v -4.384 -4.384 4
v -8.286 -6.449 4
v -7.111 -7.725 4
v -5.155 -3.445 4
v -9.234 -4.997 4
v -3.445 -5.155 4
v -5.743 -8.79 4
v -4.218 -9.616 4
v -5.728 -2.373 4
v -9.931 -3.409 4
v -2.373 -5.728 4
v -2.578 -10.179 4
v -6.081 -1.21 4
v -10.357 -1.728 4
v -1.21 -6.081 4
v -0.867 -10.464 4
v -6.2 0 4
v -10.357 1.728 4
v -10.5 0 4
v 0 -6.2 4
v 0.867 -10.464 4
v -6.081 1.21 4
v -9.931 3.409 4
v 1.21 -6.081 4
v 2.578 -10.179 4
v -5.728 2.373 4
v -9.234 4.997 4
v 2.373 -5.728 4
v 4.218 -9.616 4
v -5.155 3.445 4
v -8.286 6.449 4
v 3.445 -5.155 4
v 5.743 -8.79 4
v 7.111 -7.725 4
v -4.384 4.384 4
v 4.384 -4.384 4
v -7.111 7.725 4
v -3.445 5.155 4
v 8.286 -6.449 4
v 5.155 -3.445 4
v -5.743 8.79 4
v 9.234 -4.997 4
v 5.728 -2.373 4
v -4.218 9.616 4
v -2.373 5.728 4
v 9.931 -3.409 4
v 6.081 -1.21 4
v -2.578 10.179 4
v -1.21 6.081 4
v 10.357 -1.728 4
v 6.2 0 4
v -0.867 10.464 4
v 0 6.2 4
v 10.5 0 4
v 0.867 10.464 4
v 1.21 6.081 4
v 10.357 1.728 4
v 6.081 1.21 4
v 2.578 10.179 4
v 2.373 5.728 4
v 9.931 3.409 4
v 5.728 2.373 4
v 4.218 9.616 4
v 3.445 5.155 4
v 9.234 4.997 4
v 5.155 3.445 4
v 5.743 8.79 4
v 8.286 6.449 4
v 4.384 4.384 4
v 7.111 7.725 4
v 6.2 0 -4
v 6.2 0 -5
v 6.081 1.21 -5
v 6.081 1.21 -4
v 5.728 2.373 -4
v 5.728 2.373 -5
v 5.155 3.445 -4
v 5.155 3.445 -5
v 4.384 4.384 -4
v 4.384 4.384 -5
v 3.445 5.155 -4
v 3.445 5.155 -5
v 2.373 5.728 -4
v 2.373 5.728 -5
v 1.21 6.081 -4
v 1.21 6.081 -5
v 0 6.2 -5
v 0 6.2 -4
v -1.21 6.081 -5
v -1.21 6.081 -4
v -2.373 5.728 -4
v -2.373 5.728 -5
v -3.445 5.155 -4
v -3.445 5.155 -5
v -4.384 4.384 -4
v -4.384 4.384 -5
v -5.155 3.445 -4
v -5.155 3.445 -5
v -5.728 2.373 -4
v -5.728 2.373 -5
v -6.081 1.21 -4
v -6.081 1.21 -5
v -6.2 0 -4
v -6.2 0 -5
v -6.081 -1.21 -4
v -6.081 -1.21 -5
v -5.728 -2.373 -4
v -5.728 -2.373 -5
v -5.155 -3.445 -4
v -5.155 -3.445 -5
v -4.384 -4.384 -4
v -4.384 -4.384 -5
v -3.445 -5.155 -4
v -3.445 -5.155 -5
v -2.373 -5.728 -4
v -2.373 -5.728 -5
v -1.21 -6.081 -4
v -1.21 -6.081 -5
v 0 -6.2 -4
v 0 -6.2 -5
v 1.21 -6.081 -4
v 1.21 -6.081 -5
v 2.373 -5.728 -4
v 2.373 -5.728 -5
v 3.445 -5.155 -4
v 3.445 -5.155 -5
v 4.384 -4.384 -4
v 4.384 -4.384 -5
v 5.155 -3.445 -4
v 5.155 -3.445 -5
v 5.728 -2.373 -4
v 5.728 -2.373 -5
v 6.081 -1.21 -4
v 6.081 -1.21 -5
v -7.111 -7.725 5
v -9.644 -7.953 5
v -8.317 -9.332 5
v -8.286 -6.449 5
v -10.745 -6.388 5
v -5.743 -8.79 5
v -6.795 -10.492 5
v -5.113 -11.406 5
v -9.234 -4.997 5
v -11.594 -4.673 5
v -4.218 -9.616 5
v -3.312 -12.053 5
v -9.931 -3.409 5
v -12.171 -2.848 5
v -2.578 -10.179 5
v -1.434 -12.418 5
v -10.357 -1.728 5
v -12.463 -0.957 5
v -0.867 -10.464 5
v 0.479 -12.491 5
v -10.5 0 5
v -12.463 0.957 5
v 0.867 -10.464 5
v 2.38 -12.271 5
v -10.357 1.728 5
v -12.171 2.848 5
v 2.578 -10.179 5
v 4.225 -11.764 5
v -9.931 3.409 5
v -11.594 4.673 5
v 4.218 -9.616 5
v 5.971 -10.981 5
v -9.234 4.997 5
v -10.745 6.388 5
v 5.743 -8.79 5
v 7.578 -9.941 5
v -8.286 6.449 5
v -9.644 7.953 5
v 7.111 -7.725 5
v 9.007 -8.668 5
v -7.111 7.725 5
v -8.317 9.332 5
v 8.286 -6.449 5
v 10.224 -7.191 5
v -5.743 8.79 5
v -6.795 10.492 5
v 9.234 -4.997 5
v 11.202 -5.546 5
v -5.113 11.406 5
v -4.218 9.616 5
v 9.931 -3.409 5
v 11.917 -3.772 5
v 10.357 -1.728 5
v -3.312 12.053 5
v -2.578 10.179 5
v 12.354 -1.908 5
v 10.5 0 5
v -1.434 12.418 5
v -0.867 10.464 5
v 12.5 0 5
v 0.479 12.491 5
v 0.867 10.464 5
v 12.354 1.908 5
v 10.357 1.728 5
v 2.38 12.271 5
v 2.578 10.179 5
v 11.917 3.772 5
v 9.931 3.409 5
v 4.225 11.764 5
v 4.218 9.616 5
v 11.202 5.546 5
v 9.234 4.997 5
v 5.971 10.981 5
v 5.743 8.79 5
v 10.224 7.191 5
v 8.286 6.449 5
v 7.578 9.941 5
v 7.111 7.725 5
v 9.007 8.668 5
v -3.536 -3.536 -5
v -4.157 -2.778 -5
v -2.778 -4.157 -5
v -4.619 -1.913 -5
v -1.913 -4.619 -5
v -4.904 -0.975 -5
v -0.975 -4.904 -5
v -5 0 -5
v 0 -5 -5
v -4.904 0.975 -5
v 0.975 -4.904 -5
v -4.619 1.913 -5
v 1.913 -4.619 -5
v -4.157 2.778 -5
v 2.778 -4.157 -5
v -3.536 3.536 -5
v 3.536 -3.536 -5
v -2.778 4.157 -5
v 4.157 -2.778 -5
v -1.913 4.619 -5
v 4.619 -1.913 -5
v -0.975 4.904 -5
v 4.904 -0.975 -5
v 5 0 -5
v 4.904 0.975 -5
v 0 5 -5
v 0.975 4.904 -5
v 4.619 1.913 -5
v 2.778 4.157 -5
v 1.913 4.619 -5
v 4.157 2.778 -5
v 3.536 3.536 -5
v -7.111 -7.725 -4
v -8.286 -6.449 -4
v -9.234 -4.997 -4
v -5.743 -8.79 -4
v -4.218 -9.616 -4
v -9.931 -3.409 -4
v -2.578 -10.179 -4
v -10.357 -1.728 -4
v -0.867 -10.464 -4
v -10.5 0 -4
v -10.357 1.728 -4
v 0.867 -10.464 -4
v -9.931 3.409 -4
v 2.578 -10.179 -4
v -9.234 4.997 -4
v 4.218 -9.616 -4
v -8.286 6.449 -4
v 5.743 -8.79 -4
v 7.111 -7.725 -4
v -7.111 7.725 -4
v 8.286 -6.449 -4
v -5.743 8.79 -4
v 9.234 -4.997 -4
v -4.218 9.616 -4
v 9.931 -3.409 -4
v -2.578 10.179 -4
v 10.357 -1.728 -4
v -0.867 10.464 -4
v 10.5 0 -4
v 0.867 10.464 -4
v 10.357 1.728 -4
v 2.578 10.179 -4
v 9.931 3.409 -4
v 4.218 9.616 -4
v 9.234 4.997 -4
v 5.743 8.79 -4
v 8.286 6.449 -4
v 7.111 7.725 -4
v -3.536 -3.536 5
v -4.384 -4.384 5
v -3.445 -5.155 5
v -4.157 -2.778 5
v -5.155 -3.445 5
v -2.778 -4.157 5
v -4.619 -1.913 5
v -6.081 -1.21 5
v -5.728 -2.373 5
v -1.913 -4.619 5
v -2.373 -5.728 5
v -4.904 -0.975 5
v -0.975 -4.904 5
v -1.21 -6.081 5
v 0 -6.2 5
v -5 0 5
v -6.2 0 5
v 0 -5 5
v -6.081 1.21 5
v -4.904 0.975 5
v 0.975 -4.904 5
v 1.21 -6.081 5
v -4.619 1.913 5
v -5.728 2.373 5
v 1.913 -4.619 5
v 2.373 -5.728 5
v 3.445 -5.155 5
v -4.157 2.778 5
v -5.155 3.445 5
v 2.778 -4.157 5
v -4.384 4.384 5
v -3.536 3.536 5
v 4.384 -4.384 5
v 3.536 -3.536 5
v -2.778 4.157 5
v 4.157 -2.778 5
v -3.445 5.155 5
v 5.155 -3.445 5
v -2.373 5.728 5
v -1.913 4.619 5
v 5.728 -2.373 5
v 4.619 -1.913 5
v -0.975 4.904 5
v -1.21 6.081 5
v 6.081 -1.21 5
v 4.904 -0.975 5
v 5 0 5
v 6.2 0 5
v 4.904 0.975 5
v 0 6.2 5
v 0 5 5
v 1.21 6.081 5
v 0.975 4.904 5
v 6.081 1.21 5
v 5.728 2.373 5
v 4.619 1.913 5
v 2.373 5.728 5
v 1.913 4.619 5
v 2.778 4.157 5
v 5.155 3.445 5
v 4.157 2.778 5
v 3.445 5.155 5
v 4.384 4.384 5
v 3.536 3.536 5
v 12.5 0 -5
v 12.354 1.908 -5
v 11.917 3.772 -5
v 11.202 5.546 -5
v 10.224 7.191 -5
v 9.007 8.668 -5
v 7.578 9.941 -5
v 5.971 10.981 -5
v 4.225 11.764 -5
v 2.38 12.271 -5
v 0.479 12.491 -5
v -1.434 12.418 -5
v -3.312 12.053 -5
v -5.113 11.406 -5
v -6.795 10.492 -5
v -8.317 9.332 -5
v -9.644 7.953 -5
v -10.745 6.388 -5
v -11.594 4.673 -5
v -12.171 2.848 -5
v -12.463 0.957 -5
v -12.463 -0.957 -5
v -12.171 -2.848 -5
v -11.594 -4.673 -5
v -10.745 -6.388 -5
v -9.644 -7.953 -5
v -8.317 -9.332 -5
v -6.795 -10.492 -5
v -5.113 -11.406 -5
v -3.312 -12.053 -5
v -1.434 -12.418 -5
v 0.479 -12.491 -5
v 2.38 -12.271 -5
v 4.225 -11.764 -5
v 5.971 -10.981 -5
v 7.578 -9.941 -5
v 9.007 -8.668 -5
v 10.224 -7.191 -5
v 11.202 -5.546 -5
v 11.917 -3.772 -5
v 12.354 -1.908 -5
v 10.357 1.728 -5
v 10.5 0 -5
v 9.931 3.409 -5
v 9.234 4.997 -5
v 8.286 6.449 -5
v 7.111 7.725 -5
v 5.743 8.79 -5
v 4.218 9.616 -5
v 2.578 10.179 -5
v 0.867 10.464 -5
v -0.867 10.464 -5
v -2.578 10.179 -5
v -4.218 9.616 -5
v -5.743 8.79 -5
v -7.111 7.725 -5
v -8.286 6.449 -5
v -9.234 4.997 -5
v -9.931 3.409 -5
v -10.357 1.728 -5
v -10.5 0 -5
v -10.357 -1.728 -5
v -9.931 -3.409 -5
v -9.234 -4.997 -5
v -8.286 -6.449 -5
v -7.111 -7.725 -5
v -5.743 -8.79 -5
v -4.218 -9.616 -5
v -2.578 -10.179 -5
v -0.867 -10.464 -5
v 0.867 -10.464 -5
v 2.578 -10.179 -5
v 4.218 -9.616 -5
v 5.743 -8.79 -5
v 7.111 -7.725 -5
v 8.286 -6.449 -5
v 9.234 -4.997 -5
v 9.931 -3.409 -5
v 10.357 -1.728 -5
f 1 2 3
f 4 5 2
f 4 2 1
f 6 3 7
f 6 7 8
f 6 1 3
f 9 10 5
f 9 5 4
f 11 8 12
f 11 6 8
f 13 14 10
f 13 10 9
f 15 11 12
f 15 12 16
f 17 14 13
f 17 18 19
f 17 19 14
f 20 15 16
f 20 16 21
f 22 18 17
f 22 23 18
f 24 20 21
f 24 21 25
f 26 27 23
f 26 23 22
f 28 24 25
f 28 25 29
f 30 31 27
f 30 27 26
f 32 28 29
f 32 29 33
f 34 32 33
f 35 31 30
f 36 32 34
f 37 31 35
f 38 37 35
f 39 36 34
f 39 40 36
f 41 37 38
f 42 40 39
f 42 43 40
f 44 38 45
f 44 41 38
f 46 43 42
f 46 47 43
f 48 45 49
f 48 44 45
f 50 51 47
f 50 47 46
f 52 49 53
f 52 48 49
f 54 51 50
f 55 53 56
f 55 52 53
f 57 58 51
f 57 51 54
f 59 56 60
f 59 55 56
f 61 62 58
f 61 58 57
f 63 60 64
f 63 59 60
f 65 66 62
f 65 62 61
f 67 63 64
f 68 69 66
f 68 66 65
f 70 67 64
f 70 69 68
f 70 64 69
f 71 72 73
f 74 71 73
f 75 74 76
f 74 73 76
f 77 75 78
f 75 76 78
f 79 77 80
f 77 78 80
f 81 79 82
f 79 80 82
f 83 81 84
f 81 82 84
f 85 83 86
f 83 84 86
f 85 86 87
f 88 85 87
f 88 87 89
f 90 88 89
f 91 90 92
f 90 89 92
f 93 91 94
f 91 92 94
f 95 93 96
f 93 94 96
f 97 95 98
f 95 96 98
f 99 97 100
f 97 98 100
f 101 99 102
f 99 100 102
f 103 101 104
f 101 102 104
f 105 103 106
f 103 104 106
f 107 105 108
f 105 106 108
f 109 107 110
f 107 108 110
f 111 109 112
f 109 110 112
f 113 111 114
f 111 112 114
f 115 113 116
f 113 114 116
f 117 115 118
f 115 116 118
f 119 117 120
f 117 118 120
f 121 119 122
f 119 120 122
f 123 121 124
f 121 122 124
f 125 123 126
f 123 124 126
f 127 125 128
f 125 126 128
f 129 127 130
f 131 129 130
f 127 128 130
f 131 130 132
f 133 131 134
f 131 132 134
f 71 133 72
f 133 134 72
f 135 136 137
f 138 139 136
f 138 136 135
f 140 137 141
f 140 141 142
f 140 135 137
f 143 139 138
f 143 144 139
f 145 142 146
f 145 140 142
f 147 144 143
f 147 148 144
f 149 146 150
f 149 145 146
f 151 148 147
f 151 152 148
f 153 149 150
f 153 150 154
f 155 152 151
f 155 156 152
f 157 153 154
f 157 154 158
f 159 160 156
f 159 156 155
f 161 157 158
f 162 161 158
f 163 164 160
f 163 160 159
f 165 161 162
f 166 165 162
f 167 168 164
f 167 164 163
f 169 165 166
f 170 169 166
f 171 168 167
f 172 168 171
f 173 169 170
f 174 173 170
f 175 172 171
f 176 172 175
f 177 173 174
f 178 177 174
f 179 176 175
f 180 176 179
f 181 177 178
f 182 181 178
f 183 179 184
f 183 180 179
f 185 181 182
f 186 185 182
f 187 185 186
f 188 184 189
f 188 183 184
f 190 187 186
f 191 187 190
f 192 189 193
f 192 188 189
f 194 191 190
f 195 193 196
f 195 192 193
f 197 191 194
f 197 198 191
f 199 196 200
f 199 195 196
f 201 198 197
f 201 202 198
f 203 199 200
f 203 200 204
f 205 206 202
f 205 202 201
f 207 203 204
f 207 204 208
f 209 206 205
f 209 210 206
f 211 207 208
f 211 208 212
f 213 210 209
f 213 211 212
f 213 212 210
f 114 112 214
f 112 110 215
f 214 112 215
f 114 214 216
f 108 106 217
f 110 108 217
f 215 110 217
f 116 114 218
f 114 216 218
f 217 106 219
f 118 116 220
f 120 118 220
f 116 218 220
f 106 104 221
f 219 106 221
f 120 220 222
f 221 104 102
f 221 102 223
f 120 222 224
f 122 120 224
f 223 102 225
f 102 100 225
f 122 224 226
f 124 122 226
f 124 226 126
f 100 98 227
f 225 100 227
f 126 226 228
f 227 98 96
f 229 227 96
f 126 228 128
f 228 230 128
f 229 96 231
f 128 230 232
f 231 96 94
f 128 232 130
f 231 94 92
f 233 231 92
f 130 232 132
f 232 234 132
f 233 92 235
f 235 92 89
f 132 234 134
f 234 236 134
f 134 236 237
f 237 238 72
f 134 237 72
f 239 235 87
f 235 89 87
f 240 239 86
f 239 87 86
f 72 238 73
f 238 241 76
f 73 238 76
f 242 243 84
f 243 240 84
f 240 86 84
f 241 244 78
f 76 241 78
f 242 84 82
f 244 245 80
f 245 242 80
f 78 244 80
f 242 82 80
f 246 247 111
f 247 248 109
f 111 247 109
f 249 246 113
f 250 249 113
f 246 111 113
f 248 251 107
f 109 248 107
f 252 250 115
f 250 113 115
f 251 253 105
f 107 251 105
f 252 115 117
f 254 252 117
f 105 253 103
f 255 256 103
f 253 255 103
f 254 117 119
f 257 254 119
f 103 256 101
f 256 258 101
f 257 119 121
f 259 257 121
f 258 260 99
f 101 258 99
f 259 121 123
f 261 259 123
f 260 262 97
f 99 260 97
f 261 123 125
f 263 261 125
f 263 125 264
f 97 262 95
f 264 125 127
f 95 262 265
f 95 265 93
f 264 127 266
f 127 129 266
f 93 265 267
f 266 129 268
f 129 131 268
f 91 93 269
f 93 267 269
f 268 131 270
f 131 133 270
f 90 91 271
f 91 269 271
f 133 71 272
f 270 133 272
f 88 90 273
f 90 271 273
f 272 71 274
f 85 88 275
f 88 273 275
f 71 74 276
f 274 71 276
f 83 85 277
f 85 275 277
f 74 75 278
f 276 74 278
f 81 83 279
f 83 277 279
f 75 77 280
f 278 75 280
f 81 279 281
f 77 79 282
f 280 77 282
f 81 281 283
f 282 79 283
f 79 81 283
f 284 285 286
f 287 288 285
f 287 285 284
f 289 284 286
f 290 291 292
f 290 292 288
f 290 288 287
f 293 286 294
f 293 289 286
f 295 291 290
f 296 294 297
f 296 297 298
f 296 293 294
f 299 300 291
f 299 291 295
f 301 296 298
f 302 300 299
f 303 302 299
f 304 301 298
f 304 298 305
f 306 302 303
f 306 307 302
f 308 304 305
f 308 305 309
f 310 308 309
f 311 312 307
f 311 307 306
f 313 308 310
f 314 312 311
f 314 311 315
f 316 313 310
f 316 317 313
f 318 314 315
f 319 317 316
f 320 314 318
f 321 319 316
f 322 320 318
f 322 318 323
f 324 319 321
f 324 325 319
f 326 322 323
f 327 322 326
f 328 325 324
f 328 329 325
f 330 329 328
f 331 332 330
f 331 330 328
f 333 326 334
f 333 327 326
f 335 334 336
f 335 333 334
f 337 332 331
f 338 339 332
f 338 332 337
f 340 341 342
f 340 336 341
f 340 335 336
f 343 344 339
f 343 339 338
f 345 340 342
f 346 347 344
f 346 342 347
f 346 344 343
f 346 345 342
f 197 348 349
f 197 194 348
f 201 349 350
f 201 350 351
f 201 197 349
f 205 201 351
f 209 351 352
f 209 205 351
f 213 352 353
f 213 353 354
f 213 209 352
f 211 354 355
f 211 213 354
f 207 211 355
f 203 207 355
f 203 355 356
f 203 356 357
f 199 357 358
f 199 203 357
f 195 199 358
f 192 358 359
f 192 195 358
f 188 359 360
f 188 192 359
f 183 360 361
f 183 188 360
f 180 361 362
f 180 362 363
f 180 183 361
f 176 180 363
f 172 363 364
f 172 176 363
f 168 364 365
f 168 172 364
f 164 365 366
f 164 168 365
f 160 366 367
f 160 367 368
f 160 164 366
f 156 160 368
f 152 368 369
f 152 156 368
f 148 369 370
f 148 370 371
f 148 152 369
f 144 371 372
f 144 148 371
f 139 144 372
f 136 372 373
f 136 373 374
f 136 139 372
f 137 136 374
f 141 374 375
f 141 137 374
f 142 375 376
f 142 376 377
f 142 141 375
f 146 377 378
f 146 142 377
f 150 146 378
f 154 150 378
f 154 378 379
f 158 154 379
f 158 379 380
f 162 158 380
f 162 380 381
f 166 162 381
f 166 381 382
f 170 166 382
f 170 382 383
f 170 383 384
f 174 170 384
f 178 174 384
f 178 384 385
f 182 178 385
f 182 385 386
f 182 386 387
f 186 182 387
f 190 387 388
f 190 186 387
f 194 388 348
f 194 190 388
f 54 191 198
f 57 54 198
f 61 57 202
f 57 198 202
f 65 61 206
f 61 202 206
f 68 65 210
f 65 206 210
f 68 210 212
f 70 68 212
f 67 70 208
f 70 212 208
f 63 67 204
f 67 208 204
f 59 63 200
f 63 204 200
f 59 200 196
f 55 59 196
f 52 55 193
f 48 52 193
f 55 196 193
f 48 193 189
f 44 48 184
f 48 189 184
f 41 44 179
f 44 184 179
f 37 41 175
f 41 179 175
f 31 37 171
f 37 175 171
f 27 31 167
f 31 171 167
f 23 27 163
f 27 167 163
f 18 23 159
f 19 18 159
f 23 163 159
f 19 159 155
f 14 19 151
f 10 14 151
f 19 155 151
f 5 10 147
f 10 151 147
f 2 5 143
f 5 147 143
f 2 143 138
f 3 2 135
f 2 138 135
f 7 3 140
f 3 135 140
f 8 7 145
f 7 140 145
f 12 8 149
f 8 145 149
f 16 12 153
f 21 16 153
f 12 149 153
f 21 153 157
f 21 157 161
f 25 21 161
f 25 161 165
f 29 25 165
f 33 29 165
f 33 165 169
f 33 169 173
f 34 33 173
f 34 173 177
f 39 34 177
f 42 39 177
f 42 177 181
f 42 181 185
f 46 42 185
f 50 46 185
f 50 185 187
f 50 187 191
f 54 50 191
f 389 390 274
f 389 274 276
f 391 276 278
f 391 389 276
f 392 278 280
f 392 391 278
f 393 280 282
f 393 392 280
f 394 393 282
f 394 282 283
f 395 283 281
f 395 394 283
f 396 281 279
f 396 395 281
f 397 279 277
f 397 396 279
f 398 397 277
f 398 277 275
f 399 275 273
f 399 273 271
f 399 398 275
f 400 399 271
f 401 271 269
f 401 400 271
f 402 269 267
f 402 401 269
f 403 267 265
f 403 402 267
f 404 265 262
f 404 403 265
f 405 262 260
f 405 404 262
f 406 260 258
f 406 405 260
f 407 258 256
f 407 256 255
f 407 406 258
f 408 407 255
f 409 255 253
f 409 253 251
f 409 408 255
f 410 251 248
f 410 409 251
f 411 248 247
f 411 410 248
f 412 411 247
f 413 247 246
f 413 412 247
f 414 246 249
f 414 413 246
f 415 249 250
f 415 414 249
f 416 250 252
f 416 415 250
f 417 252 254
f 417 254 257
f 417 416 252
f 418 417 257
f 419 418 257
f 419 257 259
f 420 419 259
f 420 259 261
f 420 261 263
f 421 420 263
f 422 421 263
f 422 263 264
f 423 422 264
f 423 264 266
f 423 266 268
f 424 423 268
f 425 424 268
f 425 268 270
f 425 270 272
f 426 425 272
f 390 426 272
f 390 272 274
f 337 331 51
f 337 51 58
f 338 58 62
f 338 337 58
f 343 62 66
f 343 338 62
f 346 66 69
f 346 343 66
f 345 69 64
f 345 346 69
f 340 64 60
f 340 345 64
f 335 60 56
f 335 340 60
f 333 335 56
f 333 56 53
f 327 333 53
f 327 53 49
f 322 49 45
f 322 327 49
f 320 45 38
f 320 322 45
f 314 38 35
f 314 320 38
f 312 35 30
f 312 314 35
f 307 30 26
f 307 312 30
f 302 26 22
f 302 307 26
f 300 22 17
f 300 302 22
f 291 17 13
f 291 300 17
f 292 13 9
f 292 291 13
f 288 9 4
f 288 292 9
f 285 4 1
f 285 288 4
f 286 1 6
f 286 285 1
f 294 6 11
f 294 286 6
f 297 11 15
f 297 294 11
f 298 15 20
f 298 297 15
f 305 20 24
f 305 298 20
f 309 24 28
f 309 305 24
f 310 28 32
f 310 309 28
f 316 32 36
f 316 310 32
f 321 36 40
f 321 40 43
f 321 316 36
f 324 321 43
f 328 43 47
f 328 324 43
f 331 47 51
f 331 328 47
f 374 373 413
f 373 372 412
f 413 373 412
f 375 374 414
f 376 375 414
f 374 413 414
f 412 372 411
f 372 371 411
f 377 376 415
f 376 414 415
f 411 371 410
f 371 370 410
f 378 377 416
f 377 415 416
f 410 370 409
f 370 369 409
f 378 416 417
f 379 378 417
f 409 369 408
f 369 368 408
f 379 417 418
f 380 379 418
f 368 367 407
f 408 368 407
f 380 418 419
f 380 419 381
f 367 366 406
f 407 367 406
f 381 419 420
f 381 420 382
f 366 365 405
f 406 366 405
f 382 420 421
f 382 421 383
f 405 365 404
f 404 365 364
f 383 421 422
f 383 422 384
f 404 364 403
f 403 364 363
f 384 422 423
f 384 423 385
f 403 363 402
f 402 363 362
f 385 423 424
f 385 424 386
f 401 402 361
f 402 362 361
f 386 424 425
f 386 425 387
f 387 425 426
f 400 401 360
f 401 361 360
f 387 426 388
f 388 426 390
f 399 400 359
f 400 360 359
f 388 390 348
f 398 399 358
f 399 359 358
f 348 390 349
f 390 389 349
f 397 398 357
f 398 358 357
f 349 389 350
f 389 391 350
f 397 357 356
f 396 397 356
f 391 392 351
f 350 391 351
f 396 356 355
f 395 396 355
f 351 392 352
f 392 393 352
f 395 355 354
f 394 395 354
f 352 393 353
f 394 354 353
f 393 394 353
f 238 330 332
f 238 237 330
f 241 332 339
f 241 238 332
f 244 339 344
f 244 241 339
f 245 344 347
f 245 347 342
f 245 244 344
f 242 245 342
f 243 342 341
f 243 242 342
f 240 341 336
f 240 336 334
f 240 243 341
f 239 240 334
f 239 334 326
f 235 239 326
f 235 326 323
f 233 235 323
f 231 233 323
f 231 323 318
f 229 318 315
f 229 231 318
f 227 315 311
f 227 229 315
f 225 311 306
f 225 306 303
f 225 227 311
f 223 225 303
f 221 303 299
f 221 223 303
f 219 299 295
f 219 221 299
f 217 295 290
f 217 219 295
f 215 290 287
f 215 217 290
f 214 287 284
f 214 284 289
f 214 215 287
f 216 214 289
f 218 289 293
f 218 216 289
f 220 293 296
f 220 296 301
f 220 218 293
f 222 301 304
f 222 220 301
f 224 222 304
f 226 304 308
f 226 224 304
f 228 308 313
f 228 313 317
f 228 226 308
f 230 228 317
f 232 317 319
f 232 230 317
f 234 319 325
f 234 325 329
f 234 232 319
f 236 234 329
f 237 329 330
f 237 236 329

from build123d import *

# Parameters (mm, degrees)
SKETCH1_R           = 12.5
SKETCH1_R_2         = 5
BOSS_EXTRUDE1_DEPTH = 5
SKETCH2_R           = 10.5
SKETCH2_R_2         = 6.2
CUT_EXTRUDE1_DEPTH  = 1


with BuildPart() as part:
    # Sketch1 → Boss-Extrude1 (new body, symmetric)
    with BuildSketch(Plane.XY):
        Circle(SKETCH1_R)
        Circle(SKETCH1_R_2, mode=Mode.SUBTRACT)
    extrude(amount=BOSS_EXTRUDE1_DEPTH, both=True)

    # Sketch2 → Cut-Extrude1 (cut)
    with BuildSketch(Plane.XY.offset(5)):
        Circle(SKETCH2_R)
        Circle(SKETCH2_R_2, mode=Mode.SUBTRACT)
    cut_extrude1 = extrude(amount=-CUT_EXTRUDE1_DEPTH, mode=Mode.SUBTRACT)

    # Mirror1: Cut-Extrude1 across plane
    add(cut_extrude1.mirror(Plane.XY), mode=Mode.SUBTRACT)


solid = part.part
